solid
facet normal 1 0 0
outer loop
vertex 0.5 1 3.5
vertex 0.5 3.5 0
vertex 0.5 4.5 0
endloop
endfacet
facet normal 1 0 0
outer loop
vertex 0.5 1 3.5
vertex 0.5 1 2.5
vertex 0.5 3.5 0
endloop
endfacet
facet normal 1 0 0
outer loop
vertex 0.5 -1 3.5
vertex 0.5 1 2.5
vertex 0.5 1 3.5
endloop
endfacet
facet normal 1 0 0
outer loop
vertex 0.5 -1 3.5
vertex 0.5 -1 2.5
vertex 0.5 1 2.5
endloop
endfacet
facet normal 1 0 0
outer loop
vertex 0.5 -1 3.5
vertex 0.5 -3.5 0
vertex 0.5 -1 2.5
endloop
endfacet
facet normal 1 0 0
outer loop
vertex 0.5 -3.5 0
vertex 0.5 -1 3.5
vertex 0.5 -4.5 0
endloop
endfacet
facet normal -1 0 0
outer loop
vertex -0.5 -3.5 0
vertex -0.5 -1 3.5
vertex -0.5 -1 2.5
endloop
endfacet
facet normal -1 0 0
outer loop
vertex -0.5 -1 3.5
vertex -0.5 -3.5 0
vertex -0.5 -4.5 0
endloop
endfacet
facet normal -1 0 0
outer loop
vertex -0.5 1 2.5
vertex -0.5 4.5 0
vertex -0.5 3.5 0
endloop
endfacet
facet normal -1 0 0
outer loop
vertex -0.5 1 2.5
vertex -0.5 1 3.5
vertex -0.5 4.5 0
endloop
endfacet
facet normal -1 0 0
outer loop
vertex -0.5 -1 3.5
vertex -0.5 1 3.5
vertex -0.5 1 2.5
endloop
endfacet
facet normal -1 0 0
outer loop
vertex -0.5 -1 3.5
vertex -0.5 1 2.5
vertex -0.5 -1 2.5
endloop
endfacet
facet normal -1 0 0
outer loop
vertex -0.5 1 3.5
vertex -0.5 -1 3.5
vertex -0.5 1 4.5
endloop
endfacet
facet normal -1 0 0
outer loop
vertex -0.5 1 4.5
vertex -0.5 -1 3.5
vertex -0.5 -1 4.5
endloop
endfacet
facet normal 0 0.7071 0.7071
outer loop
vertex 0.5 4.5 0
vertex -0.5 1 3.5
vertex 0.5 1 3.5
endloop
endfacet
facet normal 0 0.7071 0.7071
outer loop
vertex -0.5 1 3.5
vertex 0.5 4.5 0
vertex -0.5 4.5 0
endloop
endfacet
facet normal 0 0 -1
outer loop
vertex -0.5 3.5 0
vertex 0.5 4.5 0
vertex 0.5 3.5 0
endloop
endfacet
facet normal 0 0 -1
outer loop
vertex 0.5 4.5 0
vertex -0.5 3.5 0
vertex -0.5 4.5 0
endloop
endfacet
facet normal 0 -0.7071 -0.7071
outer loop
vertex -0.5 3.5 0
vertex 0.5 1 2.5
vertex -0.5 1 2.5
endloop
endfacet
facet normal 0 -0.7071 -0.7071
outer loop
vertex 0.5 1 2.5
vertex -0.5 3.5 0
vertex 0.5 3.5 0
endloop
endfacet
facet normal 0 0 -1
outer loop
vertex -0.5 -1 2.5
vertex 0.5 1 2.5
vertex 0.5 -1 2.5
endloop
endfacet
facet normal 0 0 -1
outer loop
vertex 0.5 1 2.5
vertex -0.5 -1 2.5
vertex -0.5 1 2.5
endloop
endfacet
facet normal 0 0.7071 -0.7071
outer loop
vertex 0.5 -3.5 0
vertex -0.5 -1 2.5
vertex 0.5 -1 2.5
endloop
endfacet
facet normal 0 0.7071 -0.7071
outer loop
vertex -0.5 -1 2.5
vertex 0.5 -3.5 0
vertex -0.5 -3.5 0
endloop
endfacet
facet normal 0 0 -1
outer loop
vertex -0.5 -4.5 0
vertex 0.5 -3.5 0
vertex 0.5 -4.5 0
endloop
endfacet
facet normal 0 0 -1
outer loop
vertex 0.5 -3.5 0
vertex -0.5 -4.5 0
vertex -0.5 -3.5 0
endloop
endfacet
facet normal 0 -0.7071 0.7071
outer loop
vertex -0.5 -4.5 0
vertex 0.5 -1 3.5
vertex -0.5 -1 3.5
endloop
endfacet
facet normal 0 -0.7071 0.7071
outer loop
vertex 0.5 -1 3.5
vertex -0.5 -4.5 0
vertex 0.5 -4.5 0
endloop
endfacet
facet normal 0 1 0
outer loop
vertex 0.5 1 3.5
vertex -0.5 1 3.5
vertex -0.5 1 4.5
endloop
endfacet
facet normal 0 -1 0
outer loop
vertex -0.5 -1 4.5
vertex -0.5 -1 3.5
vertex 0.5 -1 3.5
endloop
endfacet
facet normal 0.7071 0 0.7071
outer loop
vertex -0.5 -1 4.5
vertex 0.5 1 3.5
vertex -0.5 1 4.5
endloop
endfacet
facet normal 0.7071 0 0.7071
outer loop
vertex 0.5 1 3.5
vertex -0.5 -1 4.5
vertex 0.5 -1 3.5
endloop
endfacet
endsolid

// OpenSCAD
$fn=64;
union(){translate(v = [0.500, -4.500])
union(){rotate(a = [0, -90, 0])
linear_extrude(height = 1){polygon(points = [[0, 0], [3.500, 3.500], [3.500, 5.500], [0, 9.000], [0, 8.000], [2.500, 5.500], [2.500, 3.500], [0, 1], [0, 0]]);
}
translate(v = [-1, 5.500, 3.500])
rotate(a = [90, 0, 0])
linear_extrude(height = 2){polygon(points = [[0, 0], [1.000, 0.000], [0, 1], [0, 0]]);
}
}
}
